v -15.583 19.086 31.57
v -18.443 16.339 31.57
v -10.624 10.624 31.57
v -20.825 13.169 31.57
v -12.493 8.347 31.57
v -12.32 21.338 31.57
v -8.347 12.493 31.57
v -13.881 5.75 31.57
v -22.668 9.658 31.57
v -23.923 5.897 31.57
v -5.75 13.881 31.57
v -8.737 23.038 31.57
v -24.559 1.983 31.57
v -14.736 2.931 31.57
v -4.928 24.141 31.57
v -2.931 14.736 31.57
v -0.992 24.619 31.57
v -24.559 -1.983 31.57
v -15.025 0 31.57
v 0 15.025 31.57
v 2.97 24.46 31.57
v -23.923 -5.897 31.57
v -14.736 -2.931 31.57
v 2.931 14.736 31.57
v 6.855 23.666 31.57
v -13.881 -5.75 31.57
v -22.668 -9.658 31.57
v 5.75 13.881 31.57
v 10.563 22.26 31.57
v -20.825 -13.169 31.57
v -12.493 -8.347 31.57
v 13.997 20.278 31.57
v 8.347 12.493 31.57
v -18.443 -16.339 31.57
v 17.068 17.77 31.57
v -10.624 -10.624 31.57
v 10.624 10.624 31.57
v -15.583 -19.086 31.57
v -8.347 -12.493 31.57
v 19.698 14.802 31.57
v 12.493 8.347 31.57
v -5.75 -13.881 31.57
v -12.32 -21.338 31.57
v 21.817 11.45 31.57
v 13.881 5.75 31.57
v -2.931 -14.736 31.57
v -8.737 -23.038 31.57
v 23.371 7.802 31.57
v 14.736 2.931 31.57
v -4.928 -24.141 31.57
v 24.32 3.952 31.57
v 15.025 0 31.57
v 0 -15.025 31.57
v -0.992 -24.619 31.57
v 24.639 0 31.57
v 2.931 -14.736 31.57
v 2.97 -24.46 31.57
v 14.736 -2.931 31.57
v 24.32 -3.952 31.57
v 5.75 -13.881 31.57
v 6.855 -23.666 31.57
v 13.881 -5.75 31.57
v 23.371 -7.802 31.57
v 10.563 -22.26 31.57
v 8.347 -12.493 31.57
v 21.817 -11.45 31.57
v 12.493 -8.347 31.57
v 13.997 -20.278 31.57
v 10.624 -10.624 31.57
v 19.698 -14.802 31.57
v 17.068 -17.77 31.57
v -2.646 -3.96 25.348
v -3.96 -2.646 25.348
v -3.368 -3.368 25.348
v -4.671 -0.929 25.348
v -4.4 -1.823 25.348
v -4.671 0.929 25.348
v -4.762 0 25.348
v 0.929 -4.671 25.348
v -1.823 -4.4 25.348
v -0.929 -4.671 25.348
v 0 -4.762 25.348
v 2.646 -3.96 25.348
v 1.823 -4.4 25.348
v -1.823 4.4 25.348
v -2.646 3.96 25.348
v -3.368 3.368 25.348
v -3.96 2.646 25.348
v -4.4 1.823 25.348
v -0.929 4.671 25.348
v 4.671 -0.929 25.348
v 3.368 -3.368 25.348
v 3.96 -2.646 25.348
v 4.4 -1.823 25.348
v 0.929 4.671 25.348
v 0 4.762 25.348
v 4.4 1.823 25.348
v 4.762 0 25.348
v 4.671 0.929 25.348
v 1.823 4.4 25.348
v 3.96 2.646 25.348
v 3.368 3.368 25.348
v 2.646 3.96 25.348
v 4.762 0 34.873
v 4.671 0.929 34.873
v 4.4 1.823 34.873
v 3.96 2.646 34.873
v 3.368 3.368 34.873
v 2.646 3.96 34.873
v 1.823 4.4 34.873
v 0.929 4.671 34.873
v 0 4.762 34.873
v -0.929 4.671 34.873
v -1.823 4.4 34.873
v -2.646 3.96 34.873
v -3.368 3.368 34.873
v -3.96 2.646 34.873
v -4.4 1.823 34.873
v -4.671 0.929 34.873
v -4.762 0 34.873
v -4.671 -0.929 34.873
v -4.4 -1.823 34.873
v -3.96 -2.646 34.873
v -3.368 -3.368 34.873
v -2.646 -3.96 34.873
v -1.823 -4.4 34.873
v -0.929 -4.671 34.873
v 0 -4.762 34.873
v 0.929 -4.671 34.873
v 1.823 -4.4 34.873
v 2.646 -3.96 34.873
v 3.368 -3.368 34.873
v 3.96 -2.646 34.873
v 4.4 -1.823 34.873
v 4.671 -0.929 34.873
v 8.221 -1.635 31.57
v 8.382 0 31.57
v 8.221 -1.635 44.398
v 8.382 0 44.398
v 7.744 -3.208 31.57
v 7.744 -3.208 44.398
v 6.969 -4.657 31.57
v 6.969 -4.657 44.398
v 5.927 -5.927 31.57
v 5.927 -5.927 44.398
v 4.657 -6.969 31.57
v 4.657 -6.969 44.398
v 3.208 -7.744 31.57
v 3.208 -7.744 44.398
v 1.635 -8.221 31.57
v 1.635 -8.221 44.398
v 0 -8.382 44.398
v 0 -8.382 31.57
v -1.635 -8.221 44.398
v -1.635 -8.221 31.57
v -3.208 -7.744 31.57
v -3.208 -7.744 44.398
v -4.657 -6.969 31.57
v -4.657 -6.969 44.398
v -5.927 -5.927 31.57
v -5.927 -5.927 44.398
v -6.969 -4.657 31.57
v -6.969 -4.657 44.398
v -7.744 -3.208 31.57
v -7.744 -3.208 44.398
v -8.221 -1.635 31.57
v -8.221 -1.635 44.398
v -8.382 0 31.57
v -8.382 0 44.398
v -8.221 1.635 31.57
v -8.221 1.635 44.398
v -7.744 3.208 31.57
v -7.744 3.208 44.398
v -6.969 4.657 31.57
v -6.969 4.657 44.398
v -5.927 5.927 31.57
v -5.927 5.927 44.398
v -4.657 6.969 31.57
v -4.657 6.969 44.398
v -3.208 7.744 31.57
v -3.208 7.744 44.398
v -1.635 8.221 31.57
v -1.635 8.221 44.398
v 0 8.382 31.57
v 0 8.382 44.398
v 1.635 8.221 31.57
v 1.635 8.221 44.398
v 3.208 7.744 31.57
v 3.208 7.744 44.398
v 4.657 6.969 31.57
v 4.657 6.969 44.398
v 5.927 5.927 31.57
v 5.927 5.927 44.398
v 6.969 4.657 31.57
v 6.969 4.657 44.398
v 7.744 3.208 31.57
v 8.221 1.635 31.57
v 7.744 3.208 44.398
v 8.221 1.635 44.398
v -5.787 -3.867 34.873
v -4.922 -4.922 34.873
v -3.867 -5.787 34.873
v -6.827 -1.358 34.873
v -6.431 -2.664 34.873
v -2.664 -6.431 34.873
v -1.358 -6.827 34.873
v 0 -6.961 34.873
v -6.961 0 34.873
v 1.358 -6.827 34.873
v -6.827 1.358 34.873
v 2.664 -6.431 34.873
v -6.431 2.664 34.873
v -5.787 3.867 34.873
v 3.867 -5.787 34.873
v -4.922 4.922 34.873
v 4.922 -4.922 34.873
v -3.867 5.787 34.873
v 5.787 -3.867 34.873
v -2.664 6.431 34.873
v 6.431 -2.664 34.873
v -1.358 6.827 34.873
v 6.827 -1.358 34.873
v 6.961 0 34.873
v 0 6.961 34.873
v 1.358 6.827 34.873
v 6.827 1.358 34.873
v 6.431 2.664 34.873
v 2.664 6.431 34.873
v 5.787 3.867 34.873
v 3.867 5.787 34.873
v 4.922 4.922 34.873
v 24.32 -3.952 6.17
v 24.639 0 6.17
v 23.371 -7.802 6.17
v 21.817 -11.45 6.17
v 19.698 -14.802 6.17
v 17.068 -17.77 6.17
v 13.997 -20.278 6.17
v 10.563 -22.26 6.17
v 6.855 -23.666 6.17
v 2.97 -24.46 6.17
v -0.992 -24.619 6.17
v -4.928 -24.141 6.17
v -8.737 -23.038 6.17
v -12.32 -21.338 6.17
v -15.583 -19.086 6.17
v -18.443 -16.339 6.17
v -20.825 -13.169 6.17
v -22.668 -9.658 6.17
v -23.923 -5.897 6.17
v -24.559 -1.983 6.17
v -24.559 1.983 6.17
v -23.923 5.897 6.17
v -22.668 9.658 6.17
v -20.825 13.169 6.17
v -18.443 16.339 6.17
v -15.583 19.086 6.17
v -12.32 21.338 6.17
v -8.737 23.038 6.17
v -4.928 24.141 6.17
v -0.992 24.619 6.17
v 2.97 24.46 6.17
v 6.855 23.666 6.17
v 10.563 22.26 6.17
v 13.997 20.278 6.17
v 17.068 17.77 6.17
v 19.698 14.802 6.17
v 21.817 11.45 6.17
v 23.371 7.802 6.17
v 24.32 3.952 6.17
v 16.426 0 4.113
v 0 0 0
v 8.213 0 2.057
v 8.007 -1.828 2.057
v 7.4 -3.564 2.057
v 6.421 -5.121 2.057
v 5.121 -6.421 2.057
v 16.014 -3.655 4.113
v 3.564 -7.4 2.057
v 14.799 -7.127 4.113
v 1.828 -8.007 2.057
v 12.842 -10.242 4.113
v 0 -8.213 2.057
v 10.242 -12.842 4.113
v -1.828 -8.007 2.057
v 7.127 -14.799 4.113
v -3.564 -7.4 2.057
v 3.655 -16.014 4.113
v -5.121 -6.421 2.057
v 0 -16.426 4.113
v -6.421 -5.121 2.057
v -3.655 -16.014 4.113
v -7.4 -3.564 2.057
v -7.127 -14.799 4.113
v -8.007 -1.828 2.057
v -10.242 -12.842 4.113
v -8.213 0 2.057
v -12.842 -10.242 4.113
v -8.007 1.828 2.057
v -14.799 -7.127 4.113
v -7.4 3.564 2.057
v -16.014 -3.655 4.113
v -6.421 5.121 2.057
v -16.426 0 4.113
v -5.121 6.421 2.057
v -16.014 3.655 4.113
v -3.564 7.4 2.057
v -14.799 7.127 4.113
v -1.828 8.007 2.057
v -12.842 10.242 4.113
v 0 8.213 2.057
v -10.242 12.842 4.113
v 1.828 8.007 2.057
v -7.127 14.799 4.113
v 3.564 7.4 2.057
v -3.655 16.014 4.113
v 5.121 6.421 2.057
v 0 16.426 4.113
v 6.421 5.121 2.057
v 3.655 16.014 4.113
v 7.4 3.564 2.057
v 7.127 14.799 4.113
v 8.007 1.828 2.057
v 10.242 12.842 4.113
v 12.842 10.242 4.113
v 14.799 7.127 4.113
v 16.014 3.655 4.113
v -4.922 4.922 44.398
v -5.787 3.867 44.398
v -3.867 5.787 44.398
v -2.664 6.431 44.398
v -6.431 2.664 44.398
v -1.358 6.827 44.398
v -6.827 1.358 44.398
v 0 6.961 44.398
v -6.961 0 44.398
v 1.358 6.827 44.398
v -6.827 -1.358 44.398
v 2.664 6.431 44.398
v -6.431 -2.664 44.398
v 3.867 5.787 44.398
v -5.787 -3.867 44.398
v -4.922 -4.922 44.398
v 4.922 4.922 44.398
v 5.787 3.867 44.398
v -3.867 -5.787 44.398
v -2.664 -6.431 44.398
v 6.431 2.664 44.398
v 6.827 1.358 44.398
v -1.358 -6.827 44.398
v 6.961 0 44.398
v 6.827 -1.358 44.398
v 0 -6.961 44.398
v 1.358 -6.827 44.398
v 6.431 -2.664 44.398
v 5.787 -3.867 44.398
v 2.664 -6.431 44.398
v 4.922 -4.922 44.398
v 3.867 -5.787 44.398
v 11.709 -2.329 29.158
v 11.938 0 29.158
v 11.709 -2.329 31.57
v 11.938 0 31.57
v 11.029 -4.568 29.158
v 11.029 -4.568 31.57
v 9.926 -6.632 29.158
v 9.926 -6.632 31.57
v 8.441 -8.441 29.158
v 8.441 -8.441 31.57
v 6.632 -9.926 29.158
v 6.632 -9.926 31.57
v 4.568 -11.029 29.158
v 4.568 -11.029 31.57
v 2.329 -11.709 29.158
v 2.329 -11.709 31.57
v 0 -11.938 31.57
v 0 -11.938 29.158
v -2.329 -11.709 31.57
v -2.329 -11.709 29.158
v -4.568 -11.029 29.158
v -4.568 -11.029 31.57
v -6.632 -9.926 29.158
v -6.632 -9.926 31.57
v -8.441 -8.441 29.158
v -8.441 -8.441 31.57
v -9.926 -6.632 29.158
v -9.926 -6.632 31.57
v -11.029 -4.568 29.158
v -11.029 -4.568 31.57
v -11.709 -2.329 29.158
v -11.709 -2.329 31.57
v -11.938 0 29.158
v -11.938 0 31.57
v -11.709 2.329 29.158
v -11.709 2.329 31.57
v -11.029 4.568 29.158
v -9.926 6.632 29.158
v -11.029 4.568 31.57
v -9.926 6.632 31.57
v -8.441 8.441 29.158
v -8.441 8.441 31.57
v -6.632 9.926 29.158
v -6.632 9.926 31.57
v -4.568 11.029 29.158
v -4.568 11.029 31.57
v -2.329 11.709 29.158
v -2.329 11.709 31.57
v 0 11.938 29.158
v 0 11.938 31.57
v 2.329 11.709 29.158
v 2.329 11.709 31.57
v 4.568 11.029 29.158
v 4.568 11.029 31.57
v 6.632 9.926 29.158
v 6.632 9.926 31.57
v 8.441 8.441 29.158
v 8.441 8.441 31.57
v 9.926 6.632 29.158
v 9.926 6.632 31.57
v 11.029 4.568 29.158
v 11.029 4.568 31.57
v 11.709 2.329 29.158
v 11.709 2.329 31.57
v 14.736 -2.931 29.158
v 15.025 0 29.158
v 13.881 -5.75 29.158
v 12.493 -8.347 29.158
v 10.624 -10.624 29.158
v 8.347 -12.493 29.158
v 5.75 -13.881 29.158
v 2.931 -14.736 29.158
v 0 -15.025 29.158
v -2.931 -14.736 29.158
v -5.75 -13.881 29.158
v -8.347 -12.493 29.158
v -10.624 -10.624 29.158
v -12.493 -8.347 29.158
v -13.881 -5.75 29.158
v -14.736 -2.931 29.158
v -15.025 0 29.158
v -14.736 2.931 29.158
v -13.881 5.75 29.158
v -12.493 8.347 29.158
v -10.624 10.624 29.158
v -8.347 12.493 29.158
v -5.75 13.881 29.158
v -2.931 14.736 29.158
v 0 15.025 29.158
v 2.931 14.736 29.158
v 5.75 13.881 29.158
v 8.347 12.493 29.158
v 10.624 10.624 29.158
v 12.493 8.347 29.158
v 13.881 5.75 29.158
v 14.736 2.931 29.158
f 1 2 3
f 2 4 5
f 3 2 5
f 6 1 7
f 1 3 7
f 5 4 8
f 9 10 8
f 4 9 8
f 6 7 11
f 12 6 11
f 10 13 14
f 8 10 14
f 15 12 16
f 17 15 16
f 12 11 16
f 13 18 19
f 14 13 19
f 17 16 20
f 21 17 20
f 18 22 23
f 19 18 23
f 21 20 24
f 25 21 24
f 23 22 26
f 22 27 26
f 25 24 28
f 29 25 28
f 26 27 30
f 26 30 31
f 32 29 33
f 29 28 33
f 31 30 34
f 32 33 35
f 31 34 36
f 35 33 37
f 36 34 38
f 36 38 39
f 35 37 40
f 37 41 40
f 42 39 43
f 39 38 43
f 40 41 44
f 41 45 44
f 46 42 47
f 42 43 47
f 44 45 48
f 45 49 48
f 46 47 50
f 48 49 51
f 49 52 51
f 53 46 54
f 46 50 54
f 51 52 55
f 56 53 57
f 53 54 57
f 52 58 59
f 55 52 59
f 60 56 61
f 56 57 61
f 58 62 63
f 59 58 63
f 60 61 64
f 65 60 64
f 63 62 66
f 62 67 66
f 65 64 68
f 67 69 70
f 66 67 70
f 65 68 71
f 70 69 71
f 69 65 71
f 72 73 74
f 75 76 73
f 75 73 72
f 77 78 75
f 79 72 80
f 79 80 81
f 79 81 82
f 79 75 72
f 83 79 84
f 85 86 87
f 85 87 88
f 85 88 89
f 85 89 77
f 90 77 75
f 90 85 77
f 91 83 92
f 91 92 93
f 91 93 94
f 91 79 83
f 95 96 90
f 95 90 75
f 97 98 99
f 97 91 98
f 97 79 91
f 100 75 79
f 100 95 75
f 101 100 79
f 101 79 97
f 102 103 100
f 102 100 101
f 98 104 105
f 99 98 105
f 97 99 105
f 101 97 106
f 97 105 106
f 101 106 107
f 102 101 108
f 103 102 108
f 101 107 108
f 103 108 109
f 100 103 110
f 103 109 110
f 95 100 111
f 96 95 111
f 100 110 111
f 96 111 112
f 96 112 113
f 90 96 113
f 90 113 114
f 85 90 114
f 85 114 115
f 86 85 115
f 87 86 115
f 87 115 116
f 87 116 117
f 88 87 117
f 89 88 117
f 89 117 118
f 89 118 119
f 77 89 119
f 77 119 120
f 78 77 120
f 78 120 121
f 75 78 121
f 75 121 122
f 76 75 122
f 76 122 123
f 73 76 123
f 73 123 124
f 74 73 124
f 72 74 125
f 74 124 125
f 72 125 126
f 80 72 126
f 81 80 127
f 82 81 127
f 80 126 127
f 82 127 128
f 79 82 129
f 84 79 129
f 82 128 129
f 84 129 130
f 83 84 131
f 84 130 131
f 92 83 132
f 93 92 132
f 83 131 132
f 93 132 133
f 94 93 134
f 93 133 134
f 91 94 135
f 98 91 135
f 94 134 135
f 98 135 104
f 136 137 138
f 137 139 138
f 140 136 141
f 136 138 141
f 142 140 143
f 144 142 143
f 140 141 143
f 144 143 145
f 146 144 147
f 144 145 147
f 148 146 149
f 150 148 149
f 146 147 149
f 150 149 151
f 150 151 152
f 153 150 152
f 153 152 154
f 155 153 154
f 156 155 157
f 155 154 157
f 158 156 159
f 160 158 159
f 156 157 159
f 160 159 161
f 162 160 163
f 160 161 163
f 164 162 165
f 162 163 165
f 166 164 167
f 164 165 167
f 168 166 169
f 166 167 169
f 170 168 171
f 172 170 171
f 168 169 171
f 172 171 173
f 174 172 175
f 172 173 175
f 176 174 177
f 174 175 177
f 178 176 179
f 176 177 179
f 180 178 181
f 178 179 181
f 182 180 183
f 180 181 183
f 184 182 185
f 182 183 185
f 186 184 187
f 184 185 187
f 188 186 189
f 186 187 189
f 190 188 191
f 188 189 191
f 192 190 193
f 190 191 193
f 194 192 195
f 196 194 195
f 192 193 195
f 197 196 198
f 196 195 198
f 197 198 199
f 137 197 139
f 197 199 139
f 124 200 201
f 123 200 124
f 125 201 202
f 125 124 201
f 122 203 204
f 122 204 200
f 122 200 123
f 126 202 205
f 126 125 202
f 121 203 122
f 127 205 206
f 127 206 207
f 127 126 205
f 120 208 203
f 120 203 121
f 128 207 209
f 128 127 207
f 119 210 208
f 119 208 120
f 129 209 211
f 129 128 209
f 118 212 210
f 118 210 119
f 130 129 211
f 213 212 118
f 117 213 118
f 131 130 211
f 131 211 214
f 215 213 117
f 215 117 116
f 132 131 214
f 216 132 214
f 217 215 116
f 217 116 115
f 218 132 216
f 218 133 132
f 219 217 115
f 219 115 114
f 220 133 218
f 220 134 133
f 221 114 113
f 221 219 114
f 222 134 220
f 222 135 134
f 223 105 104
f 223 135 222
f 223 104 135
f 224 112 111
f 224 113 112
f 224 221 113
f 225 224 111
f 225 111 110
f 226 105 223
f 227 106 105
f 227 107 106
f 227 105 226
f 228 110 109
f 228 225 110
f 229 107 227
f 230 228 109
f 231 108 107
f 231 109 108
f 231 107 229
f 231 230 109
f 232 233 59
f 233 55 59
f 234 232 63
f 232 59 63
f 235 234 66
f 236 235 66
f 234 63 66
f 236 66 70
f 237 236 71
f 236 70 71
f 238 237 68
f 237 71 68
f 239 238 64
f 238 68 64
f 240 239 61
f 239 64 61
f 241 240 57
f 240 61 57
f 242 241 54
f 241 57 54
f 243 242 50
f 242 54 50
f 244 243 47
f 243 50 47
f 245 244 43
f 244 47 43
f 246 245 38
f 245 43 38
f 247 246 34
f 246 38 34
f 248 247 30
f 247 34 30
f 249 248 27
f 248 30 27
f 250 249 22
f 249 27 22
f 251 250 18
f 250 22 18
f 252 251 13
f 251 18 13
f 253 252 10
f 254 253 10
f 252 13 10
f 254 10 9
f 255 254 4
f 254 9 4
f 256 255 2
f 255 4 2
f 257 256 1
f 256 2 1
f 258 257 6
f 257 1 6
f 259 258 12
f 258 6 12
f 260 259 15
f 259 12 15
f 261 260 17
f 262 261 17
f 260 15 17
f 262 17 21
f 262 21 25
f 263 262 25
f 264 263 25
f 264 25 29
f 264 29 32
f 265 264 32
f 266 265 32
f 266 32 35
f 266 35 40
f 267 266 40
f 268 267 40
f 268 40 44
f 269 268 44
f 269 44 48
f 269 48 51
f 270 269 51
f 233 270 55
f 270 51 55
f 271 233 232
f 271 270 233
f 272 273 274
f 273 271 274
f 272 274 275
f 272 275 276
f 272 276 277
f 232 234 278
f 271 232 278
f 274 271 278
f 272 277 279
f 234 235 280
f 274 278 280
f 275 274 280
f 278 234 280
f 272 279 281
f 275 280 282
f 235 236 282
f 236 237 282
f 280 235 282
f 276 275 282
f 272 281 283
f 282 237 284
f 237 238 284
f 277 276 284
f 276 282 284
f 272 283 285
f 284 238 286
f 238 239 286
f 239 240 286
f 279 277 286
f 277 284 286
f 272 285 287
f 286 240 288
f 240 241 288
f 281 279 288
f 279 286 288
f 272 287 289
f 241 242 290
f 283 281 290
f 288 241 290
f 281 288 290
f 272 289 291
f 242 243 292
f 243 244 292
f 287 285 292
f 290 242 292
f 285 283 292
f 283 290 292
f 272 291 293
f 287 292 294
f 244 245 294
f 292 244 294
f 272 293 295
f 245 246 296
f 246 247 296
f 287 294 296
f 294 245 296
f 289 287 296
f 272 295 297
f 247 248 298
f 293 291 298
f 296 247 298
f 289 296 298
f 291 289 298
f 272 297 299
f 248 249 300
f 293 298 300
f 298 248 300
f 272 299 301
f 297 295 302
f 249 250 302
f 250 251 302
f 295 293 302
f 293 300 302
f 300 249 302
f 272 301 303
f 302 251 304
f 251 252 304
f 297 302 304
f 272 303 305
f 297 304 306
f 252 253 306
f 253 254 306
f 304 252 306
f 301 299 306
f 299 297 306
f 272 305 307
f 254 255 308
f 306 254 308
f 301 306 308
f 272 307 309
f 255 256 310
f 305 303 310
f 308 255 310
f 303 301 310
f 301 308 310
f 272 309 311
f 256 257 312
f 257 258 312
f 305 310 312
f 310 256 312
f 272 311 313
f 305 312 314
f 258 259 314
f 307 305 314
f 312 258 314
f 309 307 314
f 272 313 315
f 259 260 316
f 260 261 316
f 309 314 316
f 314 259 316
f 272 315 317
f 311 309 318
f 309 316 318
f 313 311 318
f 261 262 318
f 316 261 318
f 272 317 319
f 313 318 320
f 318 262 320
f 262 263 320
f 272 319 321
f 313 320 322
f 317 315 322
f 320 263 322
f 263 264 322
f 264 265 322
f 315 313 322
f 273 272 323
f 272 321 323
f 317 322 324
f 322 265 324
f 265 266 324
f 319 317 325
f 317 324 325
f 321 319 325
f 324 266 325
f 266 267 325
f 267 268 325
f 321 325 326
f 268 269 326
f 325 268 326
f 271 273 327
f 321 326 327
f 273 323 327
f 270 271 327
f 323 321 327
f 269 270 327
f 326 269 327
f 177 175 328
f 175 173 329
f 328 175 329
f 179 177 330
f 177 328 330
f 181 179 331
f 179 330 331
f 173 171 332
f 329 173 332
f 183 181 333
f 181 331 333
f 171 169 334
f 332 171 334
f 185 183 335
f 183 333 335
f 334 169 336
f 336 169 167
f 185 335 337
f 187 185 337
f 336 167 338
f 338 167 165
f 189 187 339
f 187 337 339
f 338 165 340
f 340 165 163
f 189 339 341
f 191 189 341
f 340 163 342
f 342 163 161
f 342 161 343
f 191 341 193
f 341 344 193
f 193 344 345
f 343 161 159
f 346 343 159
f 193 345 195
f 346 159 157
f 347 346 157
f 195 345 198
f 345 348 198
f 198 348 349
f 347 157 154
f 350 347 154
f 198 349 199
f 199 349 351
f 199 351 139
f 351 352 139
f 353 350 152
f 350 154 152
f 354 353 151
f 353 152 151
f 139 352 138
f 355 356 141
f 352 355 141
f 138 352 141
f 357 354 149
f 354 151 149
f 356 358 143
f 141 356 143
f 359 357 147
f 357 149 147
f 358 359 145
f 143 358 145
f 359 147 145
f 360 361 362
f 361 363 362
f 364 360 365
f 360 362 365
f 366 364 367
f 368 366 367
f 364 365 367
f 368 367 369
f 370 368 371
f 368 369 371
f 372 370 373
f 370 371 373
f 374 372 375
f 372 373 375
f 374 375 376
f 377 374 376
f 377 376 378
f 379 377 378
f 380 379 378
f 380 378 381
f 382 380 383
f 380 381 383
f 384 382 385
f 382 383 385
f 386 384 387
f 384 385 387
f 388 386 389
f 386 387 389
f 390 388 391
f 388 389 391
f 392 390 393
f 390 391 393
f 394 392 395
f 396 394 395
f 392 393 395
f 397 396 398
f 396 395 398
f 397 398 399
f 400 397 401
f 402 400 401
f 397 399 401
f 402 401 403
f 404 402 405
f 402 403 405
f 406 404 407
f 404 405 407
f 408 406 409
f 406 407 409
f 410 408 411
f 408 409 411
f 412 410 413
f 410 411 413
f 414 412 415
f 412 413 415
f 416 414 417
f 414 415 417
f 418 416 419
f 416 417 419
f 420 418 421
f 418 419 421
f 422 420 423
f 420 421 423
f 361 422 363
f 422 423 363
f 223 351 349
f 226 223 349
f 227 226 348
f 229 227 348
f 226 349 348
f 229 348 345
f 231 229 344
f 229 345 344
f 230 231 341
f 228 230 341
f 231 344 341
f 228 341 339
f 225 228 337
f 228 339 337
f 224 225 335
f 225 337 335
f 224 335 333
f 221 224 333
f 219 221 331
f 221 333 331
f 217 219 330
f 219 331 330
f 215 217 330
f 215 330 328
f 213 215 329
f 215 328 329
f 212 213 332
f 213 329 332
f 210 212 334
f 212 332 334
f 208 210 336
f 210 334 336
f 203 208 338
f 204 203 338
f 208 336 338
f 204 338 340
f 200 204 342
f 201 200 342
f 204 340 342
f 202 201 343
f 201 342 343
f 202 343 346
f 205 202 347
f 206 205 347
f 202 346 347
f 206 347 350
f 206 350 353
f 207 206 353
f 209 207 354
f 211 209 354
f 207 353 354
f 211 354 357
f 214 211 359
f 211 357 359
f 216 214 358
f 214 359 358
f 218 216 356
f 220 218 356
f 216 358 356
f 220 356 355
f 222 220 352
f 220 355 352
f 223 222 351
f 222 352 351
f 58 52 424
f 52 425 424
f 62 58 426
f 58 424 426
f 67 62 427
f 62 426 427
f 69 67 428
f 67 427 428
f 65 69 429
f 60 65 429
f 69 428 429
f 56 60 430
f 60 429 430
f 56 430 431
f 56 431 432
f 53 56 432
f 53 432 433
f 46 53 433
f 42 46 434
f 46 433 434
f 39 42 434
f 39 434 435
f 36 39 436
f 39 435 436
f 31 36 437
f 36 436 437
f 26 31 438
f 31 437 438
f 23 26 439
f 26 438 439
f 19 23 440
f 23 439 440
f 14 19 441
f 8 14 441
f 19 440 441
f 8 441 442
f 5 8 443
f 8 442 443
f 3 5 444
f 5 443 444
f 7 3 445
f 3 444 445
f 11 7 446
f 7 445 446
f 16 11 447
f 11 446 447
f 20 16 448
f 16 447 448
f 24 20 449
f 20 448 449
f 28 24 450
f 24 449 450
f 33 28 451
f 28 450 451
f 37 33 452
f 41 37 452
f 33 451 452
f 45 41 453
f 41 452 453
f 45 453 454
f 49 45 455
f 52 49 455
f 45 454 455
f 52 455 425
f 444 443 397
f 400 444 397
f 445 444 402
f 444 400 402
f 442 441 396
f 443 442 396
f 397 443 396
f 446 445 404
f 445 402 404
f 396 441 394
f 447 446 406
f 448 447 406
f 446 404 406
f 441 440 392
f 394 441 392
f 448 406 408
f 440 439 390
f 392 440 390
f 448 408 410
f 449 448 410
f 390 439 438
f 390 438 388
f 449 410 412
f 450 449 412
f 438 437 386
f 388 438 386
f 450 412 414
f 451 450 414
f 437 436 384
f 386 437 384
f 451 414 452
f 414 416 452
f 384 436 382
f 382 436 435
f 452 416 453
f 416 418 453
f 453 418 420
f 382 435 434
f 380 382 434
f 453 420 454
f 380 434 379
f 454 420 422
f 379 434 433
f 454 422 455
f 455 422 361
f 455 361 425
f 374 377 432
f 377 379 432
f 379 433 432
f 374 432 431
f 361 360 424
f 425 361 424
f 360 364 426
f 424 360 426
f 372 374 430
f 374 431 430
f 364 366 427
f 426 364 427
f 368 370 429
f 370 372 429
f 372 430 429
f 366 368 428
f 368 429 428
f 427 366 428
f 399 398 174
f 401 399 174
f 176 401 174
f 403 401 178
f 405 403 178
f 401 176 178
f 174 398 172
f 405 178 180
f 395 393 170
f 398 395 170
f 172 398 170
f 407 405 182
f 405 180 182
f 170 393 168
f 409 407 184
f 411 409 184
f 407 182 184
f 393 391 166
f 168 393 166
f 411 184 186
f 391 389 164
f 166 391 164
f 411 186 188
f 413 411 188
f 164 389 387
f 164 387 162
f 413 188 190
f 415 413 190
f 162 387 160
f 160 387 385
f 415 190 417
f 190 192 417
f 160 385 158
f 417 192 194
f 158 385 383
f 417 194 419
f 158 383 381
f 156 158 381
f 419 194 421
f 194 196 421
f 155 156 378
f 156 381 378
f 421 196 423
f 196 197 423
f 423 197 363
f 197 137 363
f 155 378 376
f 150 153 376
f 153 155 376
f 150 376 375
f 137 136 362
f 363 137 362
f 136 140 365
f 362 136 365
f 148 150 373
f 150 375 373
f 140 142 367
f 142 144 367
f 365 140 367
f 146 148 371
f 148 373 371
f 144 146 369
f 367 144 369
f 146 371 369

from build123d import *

# Parameters (mm, degrees)
F2_R      = 6.960541
F2_R_2    = 4.7625
F3_DEPTH  = 9.525
F3_FACE_R = 4.7625
F4_DEPTH  = 19.05


with BuildPart() as f1:
    # F0 (on Front) → F1 (revolve)
    with BuildSketch(Plane.XZ):
        Polygon((0, 44.39796), (0, 0), (24.639201, 6.170073), (24.639201, 31.570073), (15.024917, 31.570073), (15.024917, 29.15796), (11.938, 29.15796), (11.938, 31.570073), (8.382, 31.570073), (8.382, 44.39796), align=None)
    revolve(axis=Axis((0, 0, 22.19898), (0, 0, -1)))

    # F2 (on face) → F3 (cut)
    with BuildSketch(Plane.XY.offset(44.39796)):
        Circle(F2_R)
        Circle(F2_R_2, mode=Mode.SUBTRACT)
    extrude(amount=-F3_DEPTH, mode=Mode.SUBTRACT)

    # F3_face (on face) → F4 (cut)
    with BuildSketch(Plane.XY.offset(44.39796)):
        Circle(F3_FACE_R)
    extrude(amount=-F4_DEPTH, mode=Mode.SUBTRACT)


solid = f1.part
